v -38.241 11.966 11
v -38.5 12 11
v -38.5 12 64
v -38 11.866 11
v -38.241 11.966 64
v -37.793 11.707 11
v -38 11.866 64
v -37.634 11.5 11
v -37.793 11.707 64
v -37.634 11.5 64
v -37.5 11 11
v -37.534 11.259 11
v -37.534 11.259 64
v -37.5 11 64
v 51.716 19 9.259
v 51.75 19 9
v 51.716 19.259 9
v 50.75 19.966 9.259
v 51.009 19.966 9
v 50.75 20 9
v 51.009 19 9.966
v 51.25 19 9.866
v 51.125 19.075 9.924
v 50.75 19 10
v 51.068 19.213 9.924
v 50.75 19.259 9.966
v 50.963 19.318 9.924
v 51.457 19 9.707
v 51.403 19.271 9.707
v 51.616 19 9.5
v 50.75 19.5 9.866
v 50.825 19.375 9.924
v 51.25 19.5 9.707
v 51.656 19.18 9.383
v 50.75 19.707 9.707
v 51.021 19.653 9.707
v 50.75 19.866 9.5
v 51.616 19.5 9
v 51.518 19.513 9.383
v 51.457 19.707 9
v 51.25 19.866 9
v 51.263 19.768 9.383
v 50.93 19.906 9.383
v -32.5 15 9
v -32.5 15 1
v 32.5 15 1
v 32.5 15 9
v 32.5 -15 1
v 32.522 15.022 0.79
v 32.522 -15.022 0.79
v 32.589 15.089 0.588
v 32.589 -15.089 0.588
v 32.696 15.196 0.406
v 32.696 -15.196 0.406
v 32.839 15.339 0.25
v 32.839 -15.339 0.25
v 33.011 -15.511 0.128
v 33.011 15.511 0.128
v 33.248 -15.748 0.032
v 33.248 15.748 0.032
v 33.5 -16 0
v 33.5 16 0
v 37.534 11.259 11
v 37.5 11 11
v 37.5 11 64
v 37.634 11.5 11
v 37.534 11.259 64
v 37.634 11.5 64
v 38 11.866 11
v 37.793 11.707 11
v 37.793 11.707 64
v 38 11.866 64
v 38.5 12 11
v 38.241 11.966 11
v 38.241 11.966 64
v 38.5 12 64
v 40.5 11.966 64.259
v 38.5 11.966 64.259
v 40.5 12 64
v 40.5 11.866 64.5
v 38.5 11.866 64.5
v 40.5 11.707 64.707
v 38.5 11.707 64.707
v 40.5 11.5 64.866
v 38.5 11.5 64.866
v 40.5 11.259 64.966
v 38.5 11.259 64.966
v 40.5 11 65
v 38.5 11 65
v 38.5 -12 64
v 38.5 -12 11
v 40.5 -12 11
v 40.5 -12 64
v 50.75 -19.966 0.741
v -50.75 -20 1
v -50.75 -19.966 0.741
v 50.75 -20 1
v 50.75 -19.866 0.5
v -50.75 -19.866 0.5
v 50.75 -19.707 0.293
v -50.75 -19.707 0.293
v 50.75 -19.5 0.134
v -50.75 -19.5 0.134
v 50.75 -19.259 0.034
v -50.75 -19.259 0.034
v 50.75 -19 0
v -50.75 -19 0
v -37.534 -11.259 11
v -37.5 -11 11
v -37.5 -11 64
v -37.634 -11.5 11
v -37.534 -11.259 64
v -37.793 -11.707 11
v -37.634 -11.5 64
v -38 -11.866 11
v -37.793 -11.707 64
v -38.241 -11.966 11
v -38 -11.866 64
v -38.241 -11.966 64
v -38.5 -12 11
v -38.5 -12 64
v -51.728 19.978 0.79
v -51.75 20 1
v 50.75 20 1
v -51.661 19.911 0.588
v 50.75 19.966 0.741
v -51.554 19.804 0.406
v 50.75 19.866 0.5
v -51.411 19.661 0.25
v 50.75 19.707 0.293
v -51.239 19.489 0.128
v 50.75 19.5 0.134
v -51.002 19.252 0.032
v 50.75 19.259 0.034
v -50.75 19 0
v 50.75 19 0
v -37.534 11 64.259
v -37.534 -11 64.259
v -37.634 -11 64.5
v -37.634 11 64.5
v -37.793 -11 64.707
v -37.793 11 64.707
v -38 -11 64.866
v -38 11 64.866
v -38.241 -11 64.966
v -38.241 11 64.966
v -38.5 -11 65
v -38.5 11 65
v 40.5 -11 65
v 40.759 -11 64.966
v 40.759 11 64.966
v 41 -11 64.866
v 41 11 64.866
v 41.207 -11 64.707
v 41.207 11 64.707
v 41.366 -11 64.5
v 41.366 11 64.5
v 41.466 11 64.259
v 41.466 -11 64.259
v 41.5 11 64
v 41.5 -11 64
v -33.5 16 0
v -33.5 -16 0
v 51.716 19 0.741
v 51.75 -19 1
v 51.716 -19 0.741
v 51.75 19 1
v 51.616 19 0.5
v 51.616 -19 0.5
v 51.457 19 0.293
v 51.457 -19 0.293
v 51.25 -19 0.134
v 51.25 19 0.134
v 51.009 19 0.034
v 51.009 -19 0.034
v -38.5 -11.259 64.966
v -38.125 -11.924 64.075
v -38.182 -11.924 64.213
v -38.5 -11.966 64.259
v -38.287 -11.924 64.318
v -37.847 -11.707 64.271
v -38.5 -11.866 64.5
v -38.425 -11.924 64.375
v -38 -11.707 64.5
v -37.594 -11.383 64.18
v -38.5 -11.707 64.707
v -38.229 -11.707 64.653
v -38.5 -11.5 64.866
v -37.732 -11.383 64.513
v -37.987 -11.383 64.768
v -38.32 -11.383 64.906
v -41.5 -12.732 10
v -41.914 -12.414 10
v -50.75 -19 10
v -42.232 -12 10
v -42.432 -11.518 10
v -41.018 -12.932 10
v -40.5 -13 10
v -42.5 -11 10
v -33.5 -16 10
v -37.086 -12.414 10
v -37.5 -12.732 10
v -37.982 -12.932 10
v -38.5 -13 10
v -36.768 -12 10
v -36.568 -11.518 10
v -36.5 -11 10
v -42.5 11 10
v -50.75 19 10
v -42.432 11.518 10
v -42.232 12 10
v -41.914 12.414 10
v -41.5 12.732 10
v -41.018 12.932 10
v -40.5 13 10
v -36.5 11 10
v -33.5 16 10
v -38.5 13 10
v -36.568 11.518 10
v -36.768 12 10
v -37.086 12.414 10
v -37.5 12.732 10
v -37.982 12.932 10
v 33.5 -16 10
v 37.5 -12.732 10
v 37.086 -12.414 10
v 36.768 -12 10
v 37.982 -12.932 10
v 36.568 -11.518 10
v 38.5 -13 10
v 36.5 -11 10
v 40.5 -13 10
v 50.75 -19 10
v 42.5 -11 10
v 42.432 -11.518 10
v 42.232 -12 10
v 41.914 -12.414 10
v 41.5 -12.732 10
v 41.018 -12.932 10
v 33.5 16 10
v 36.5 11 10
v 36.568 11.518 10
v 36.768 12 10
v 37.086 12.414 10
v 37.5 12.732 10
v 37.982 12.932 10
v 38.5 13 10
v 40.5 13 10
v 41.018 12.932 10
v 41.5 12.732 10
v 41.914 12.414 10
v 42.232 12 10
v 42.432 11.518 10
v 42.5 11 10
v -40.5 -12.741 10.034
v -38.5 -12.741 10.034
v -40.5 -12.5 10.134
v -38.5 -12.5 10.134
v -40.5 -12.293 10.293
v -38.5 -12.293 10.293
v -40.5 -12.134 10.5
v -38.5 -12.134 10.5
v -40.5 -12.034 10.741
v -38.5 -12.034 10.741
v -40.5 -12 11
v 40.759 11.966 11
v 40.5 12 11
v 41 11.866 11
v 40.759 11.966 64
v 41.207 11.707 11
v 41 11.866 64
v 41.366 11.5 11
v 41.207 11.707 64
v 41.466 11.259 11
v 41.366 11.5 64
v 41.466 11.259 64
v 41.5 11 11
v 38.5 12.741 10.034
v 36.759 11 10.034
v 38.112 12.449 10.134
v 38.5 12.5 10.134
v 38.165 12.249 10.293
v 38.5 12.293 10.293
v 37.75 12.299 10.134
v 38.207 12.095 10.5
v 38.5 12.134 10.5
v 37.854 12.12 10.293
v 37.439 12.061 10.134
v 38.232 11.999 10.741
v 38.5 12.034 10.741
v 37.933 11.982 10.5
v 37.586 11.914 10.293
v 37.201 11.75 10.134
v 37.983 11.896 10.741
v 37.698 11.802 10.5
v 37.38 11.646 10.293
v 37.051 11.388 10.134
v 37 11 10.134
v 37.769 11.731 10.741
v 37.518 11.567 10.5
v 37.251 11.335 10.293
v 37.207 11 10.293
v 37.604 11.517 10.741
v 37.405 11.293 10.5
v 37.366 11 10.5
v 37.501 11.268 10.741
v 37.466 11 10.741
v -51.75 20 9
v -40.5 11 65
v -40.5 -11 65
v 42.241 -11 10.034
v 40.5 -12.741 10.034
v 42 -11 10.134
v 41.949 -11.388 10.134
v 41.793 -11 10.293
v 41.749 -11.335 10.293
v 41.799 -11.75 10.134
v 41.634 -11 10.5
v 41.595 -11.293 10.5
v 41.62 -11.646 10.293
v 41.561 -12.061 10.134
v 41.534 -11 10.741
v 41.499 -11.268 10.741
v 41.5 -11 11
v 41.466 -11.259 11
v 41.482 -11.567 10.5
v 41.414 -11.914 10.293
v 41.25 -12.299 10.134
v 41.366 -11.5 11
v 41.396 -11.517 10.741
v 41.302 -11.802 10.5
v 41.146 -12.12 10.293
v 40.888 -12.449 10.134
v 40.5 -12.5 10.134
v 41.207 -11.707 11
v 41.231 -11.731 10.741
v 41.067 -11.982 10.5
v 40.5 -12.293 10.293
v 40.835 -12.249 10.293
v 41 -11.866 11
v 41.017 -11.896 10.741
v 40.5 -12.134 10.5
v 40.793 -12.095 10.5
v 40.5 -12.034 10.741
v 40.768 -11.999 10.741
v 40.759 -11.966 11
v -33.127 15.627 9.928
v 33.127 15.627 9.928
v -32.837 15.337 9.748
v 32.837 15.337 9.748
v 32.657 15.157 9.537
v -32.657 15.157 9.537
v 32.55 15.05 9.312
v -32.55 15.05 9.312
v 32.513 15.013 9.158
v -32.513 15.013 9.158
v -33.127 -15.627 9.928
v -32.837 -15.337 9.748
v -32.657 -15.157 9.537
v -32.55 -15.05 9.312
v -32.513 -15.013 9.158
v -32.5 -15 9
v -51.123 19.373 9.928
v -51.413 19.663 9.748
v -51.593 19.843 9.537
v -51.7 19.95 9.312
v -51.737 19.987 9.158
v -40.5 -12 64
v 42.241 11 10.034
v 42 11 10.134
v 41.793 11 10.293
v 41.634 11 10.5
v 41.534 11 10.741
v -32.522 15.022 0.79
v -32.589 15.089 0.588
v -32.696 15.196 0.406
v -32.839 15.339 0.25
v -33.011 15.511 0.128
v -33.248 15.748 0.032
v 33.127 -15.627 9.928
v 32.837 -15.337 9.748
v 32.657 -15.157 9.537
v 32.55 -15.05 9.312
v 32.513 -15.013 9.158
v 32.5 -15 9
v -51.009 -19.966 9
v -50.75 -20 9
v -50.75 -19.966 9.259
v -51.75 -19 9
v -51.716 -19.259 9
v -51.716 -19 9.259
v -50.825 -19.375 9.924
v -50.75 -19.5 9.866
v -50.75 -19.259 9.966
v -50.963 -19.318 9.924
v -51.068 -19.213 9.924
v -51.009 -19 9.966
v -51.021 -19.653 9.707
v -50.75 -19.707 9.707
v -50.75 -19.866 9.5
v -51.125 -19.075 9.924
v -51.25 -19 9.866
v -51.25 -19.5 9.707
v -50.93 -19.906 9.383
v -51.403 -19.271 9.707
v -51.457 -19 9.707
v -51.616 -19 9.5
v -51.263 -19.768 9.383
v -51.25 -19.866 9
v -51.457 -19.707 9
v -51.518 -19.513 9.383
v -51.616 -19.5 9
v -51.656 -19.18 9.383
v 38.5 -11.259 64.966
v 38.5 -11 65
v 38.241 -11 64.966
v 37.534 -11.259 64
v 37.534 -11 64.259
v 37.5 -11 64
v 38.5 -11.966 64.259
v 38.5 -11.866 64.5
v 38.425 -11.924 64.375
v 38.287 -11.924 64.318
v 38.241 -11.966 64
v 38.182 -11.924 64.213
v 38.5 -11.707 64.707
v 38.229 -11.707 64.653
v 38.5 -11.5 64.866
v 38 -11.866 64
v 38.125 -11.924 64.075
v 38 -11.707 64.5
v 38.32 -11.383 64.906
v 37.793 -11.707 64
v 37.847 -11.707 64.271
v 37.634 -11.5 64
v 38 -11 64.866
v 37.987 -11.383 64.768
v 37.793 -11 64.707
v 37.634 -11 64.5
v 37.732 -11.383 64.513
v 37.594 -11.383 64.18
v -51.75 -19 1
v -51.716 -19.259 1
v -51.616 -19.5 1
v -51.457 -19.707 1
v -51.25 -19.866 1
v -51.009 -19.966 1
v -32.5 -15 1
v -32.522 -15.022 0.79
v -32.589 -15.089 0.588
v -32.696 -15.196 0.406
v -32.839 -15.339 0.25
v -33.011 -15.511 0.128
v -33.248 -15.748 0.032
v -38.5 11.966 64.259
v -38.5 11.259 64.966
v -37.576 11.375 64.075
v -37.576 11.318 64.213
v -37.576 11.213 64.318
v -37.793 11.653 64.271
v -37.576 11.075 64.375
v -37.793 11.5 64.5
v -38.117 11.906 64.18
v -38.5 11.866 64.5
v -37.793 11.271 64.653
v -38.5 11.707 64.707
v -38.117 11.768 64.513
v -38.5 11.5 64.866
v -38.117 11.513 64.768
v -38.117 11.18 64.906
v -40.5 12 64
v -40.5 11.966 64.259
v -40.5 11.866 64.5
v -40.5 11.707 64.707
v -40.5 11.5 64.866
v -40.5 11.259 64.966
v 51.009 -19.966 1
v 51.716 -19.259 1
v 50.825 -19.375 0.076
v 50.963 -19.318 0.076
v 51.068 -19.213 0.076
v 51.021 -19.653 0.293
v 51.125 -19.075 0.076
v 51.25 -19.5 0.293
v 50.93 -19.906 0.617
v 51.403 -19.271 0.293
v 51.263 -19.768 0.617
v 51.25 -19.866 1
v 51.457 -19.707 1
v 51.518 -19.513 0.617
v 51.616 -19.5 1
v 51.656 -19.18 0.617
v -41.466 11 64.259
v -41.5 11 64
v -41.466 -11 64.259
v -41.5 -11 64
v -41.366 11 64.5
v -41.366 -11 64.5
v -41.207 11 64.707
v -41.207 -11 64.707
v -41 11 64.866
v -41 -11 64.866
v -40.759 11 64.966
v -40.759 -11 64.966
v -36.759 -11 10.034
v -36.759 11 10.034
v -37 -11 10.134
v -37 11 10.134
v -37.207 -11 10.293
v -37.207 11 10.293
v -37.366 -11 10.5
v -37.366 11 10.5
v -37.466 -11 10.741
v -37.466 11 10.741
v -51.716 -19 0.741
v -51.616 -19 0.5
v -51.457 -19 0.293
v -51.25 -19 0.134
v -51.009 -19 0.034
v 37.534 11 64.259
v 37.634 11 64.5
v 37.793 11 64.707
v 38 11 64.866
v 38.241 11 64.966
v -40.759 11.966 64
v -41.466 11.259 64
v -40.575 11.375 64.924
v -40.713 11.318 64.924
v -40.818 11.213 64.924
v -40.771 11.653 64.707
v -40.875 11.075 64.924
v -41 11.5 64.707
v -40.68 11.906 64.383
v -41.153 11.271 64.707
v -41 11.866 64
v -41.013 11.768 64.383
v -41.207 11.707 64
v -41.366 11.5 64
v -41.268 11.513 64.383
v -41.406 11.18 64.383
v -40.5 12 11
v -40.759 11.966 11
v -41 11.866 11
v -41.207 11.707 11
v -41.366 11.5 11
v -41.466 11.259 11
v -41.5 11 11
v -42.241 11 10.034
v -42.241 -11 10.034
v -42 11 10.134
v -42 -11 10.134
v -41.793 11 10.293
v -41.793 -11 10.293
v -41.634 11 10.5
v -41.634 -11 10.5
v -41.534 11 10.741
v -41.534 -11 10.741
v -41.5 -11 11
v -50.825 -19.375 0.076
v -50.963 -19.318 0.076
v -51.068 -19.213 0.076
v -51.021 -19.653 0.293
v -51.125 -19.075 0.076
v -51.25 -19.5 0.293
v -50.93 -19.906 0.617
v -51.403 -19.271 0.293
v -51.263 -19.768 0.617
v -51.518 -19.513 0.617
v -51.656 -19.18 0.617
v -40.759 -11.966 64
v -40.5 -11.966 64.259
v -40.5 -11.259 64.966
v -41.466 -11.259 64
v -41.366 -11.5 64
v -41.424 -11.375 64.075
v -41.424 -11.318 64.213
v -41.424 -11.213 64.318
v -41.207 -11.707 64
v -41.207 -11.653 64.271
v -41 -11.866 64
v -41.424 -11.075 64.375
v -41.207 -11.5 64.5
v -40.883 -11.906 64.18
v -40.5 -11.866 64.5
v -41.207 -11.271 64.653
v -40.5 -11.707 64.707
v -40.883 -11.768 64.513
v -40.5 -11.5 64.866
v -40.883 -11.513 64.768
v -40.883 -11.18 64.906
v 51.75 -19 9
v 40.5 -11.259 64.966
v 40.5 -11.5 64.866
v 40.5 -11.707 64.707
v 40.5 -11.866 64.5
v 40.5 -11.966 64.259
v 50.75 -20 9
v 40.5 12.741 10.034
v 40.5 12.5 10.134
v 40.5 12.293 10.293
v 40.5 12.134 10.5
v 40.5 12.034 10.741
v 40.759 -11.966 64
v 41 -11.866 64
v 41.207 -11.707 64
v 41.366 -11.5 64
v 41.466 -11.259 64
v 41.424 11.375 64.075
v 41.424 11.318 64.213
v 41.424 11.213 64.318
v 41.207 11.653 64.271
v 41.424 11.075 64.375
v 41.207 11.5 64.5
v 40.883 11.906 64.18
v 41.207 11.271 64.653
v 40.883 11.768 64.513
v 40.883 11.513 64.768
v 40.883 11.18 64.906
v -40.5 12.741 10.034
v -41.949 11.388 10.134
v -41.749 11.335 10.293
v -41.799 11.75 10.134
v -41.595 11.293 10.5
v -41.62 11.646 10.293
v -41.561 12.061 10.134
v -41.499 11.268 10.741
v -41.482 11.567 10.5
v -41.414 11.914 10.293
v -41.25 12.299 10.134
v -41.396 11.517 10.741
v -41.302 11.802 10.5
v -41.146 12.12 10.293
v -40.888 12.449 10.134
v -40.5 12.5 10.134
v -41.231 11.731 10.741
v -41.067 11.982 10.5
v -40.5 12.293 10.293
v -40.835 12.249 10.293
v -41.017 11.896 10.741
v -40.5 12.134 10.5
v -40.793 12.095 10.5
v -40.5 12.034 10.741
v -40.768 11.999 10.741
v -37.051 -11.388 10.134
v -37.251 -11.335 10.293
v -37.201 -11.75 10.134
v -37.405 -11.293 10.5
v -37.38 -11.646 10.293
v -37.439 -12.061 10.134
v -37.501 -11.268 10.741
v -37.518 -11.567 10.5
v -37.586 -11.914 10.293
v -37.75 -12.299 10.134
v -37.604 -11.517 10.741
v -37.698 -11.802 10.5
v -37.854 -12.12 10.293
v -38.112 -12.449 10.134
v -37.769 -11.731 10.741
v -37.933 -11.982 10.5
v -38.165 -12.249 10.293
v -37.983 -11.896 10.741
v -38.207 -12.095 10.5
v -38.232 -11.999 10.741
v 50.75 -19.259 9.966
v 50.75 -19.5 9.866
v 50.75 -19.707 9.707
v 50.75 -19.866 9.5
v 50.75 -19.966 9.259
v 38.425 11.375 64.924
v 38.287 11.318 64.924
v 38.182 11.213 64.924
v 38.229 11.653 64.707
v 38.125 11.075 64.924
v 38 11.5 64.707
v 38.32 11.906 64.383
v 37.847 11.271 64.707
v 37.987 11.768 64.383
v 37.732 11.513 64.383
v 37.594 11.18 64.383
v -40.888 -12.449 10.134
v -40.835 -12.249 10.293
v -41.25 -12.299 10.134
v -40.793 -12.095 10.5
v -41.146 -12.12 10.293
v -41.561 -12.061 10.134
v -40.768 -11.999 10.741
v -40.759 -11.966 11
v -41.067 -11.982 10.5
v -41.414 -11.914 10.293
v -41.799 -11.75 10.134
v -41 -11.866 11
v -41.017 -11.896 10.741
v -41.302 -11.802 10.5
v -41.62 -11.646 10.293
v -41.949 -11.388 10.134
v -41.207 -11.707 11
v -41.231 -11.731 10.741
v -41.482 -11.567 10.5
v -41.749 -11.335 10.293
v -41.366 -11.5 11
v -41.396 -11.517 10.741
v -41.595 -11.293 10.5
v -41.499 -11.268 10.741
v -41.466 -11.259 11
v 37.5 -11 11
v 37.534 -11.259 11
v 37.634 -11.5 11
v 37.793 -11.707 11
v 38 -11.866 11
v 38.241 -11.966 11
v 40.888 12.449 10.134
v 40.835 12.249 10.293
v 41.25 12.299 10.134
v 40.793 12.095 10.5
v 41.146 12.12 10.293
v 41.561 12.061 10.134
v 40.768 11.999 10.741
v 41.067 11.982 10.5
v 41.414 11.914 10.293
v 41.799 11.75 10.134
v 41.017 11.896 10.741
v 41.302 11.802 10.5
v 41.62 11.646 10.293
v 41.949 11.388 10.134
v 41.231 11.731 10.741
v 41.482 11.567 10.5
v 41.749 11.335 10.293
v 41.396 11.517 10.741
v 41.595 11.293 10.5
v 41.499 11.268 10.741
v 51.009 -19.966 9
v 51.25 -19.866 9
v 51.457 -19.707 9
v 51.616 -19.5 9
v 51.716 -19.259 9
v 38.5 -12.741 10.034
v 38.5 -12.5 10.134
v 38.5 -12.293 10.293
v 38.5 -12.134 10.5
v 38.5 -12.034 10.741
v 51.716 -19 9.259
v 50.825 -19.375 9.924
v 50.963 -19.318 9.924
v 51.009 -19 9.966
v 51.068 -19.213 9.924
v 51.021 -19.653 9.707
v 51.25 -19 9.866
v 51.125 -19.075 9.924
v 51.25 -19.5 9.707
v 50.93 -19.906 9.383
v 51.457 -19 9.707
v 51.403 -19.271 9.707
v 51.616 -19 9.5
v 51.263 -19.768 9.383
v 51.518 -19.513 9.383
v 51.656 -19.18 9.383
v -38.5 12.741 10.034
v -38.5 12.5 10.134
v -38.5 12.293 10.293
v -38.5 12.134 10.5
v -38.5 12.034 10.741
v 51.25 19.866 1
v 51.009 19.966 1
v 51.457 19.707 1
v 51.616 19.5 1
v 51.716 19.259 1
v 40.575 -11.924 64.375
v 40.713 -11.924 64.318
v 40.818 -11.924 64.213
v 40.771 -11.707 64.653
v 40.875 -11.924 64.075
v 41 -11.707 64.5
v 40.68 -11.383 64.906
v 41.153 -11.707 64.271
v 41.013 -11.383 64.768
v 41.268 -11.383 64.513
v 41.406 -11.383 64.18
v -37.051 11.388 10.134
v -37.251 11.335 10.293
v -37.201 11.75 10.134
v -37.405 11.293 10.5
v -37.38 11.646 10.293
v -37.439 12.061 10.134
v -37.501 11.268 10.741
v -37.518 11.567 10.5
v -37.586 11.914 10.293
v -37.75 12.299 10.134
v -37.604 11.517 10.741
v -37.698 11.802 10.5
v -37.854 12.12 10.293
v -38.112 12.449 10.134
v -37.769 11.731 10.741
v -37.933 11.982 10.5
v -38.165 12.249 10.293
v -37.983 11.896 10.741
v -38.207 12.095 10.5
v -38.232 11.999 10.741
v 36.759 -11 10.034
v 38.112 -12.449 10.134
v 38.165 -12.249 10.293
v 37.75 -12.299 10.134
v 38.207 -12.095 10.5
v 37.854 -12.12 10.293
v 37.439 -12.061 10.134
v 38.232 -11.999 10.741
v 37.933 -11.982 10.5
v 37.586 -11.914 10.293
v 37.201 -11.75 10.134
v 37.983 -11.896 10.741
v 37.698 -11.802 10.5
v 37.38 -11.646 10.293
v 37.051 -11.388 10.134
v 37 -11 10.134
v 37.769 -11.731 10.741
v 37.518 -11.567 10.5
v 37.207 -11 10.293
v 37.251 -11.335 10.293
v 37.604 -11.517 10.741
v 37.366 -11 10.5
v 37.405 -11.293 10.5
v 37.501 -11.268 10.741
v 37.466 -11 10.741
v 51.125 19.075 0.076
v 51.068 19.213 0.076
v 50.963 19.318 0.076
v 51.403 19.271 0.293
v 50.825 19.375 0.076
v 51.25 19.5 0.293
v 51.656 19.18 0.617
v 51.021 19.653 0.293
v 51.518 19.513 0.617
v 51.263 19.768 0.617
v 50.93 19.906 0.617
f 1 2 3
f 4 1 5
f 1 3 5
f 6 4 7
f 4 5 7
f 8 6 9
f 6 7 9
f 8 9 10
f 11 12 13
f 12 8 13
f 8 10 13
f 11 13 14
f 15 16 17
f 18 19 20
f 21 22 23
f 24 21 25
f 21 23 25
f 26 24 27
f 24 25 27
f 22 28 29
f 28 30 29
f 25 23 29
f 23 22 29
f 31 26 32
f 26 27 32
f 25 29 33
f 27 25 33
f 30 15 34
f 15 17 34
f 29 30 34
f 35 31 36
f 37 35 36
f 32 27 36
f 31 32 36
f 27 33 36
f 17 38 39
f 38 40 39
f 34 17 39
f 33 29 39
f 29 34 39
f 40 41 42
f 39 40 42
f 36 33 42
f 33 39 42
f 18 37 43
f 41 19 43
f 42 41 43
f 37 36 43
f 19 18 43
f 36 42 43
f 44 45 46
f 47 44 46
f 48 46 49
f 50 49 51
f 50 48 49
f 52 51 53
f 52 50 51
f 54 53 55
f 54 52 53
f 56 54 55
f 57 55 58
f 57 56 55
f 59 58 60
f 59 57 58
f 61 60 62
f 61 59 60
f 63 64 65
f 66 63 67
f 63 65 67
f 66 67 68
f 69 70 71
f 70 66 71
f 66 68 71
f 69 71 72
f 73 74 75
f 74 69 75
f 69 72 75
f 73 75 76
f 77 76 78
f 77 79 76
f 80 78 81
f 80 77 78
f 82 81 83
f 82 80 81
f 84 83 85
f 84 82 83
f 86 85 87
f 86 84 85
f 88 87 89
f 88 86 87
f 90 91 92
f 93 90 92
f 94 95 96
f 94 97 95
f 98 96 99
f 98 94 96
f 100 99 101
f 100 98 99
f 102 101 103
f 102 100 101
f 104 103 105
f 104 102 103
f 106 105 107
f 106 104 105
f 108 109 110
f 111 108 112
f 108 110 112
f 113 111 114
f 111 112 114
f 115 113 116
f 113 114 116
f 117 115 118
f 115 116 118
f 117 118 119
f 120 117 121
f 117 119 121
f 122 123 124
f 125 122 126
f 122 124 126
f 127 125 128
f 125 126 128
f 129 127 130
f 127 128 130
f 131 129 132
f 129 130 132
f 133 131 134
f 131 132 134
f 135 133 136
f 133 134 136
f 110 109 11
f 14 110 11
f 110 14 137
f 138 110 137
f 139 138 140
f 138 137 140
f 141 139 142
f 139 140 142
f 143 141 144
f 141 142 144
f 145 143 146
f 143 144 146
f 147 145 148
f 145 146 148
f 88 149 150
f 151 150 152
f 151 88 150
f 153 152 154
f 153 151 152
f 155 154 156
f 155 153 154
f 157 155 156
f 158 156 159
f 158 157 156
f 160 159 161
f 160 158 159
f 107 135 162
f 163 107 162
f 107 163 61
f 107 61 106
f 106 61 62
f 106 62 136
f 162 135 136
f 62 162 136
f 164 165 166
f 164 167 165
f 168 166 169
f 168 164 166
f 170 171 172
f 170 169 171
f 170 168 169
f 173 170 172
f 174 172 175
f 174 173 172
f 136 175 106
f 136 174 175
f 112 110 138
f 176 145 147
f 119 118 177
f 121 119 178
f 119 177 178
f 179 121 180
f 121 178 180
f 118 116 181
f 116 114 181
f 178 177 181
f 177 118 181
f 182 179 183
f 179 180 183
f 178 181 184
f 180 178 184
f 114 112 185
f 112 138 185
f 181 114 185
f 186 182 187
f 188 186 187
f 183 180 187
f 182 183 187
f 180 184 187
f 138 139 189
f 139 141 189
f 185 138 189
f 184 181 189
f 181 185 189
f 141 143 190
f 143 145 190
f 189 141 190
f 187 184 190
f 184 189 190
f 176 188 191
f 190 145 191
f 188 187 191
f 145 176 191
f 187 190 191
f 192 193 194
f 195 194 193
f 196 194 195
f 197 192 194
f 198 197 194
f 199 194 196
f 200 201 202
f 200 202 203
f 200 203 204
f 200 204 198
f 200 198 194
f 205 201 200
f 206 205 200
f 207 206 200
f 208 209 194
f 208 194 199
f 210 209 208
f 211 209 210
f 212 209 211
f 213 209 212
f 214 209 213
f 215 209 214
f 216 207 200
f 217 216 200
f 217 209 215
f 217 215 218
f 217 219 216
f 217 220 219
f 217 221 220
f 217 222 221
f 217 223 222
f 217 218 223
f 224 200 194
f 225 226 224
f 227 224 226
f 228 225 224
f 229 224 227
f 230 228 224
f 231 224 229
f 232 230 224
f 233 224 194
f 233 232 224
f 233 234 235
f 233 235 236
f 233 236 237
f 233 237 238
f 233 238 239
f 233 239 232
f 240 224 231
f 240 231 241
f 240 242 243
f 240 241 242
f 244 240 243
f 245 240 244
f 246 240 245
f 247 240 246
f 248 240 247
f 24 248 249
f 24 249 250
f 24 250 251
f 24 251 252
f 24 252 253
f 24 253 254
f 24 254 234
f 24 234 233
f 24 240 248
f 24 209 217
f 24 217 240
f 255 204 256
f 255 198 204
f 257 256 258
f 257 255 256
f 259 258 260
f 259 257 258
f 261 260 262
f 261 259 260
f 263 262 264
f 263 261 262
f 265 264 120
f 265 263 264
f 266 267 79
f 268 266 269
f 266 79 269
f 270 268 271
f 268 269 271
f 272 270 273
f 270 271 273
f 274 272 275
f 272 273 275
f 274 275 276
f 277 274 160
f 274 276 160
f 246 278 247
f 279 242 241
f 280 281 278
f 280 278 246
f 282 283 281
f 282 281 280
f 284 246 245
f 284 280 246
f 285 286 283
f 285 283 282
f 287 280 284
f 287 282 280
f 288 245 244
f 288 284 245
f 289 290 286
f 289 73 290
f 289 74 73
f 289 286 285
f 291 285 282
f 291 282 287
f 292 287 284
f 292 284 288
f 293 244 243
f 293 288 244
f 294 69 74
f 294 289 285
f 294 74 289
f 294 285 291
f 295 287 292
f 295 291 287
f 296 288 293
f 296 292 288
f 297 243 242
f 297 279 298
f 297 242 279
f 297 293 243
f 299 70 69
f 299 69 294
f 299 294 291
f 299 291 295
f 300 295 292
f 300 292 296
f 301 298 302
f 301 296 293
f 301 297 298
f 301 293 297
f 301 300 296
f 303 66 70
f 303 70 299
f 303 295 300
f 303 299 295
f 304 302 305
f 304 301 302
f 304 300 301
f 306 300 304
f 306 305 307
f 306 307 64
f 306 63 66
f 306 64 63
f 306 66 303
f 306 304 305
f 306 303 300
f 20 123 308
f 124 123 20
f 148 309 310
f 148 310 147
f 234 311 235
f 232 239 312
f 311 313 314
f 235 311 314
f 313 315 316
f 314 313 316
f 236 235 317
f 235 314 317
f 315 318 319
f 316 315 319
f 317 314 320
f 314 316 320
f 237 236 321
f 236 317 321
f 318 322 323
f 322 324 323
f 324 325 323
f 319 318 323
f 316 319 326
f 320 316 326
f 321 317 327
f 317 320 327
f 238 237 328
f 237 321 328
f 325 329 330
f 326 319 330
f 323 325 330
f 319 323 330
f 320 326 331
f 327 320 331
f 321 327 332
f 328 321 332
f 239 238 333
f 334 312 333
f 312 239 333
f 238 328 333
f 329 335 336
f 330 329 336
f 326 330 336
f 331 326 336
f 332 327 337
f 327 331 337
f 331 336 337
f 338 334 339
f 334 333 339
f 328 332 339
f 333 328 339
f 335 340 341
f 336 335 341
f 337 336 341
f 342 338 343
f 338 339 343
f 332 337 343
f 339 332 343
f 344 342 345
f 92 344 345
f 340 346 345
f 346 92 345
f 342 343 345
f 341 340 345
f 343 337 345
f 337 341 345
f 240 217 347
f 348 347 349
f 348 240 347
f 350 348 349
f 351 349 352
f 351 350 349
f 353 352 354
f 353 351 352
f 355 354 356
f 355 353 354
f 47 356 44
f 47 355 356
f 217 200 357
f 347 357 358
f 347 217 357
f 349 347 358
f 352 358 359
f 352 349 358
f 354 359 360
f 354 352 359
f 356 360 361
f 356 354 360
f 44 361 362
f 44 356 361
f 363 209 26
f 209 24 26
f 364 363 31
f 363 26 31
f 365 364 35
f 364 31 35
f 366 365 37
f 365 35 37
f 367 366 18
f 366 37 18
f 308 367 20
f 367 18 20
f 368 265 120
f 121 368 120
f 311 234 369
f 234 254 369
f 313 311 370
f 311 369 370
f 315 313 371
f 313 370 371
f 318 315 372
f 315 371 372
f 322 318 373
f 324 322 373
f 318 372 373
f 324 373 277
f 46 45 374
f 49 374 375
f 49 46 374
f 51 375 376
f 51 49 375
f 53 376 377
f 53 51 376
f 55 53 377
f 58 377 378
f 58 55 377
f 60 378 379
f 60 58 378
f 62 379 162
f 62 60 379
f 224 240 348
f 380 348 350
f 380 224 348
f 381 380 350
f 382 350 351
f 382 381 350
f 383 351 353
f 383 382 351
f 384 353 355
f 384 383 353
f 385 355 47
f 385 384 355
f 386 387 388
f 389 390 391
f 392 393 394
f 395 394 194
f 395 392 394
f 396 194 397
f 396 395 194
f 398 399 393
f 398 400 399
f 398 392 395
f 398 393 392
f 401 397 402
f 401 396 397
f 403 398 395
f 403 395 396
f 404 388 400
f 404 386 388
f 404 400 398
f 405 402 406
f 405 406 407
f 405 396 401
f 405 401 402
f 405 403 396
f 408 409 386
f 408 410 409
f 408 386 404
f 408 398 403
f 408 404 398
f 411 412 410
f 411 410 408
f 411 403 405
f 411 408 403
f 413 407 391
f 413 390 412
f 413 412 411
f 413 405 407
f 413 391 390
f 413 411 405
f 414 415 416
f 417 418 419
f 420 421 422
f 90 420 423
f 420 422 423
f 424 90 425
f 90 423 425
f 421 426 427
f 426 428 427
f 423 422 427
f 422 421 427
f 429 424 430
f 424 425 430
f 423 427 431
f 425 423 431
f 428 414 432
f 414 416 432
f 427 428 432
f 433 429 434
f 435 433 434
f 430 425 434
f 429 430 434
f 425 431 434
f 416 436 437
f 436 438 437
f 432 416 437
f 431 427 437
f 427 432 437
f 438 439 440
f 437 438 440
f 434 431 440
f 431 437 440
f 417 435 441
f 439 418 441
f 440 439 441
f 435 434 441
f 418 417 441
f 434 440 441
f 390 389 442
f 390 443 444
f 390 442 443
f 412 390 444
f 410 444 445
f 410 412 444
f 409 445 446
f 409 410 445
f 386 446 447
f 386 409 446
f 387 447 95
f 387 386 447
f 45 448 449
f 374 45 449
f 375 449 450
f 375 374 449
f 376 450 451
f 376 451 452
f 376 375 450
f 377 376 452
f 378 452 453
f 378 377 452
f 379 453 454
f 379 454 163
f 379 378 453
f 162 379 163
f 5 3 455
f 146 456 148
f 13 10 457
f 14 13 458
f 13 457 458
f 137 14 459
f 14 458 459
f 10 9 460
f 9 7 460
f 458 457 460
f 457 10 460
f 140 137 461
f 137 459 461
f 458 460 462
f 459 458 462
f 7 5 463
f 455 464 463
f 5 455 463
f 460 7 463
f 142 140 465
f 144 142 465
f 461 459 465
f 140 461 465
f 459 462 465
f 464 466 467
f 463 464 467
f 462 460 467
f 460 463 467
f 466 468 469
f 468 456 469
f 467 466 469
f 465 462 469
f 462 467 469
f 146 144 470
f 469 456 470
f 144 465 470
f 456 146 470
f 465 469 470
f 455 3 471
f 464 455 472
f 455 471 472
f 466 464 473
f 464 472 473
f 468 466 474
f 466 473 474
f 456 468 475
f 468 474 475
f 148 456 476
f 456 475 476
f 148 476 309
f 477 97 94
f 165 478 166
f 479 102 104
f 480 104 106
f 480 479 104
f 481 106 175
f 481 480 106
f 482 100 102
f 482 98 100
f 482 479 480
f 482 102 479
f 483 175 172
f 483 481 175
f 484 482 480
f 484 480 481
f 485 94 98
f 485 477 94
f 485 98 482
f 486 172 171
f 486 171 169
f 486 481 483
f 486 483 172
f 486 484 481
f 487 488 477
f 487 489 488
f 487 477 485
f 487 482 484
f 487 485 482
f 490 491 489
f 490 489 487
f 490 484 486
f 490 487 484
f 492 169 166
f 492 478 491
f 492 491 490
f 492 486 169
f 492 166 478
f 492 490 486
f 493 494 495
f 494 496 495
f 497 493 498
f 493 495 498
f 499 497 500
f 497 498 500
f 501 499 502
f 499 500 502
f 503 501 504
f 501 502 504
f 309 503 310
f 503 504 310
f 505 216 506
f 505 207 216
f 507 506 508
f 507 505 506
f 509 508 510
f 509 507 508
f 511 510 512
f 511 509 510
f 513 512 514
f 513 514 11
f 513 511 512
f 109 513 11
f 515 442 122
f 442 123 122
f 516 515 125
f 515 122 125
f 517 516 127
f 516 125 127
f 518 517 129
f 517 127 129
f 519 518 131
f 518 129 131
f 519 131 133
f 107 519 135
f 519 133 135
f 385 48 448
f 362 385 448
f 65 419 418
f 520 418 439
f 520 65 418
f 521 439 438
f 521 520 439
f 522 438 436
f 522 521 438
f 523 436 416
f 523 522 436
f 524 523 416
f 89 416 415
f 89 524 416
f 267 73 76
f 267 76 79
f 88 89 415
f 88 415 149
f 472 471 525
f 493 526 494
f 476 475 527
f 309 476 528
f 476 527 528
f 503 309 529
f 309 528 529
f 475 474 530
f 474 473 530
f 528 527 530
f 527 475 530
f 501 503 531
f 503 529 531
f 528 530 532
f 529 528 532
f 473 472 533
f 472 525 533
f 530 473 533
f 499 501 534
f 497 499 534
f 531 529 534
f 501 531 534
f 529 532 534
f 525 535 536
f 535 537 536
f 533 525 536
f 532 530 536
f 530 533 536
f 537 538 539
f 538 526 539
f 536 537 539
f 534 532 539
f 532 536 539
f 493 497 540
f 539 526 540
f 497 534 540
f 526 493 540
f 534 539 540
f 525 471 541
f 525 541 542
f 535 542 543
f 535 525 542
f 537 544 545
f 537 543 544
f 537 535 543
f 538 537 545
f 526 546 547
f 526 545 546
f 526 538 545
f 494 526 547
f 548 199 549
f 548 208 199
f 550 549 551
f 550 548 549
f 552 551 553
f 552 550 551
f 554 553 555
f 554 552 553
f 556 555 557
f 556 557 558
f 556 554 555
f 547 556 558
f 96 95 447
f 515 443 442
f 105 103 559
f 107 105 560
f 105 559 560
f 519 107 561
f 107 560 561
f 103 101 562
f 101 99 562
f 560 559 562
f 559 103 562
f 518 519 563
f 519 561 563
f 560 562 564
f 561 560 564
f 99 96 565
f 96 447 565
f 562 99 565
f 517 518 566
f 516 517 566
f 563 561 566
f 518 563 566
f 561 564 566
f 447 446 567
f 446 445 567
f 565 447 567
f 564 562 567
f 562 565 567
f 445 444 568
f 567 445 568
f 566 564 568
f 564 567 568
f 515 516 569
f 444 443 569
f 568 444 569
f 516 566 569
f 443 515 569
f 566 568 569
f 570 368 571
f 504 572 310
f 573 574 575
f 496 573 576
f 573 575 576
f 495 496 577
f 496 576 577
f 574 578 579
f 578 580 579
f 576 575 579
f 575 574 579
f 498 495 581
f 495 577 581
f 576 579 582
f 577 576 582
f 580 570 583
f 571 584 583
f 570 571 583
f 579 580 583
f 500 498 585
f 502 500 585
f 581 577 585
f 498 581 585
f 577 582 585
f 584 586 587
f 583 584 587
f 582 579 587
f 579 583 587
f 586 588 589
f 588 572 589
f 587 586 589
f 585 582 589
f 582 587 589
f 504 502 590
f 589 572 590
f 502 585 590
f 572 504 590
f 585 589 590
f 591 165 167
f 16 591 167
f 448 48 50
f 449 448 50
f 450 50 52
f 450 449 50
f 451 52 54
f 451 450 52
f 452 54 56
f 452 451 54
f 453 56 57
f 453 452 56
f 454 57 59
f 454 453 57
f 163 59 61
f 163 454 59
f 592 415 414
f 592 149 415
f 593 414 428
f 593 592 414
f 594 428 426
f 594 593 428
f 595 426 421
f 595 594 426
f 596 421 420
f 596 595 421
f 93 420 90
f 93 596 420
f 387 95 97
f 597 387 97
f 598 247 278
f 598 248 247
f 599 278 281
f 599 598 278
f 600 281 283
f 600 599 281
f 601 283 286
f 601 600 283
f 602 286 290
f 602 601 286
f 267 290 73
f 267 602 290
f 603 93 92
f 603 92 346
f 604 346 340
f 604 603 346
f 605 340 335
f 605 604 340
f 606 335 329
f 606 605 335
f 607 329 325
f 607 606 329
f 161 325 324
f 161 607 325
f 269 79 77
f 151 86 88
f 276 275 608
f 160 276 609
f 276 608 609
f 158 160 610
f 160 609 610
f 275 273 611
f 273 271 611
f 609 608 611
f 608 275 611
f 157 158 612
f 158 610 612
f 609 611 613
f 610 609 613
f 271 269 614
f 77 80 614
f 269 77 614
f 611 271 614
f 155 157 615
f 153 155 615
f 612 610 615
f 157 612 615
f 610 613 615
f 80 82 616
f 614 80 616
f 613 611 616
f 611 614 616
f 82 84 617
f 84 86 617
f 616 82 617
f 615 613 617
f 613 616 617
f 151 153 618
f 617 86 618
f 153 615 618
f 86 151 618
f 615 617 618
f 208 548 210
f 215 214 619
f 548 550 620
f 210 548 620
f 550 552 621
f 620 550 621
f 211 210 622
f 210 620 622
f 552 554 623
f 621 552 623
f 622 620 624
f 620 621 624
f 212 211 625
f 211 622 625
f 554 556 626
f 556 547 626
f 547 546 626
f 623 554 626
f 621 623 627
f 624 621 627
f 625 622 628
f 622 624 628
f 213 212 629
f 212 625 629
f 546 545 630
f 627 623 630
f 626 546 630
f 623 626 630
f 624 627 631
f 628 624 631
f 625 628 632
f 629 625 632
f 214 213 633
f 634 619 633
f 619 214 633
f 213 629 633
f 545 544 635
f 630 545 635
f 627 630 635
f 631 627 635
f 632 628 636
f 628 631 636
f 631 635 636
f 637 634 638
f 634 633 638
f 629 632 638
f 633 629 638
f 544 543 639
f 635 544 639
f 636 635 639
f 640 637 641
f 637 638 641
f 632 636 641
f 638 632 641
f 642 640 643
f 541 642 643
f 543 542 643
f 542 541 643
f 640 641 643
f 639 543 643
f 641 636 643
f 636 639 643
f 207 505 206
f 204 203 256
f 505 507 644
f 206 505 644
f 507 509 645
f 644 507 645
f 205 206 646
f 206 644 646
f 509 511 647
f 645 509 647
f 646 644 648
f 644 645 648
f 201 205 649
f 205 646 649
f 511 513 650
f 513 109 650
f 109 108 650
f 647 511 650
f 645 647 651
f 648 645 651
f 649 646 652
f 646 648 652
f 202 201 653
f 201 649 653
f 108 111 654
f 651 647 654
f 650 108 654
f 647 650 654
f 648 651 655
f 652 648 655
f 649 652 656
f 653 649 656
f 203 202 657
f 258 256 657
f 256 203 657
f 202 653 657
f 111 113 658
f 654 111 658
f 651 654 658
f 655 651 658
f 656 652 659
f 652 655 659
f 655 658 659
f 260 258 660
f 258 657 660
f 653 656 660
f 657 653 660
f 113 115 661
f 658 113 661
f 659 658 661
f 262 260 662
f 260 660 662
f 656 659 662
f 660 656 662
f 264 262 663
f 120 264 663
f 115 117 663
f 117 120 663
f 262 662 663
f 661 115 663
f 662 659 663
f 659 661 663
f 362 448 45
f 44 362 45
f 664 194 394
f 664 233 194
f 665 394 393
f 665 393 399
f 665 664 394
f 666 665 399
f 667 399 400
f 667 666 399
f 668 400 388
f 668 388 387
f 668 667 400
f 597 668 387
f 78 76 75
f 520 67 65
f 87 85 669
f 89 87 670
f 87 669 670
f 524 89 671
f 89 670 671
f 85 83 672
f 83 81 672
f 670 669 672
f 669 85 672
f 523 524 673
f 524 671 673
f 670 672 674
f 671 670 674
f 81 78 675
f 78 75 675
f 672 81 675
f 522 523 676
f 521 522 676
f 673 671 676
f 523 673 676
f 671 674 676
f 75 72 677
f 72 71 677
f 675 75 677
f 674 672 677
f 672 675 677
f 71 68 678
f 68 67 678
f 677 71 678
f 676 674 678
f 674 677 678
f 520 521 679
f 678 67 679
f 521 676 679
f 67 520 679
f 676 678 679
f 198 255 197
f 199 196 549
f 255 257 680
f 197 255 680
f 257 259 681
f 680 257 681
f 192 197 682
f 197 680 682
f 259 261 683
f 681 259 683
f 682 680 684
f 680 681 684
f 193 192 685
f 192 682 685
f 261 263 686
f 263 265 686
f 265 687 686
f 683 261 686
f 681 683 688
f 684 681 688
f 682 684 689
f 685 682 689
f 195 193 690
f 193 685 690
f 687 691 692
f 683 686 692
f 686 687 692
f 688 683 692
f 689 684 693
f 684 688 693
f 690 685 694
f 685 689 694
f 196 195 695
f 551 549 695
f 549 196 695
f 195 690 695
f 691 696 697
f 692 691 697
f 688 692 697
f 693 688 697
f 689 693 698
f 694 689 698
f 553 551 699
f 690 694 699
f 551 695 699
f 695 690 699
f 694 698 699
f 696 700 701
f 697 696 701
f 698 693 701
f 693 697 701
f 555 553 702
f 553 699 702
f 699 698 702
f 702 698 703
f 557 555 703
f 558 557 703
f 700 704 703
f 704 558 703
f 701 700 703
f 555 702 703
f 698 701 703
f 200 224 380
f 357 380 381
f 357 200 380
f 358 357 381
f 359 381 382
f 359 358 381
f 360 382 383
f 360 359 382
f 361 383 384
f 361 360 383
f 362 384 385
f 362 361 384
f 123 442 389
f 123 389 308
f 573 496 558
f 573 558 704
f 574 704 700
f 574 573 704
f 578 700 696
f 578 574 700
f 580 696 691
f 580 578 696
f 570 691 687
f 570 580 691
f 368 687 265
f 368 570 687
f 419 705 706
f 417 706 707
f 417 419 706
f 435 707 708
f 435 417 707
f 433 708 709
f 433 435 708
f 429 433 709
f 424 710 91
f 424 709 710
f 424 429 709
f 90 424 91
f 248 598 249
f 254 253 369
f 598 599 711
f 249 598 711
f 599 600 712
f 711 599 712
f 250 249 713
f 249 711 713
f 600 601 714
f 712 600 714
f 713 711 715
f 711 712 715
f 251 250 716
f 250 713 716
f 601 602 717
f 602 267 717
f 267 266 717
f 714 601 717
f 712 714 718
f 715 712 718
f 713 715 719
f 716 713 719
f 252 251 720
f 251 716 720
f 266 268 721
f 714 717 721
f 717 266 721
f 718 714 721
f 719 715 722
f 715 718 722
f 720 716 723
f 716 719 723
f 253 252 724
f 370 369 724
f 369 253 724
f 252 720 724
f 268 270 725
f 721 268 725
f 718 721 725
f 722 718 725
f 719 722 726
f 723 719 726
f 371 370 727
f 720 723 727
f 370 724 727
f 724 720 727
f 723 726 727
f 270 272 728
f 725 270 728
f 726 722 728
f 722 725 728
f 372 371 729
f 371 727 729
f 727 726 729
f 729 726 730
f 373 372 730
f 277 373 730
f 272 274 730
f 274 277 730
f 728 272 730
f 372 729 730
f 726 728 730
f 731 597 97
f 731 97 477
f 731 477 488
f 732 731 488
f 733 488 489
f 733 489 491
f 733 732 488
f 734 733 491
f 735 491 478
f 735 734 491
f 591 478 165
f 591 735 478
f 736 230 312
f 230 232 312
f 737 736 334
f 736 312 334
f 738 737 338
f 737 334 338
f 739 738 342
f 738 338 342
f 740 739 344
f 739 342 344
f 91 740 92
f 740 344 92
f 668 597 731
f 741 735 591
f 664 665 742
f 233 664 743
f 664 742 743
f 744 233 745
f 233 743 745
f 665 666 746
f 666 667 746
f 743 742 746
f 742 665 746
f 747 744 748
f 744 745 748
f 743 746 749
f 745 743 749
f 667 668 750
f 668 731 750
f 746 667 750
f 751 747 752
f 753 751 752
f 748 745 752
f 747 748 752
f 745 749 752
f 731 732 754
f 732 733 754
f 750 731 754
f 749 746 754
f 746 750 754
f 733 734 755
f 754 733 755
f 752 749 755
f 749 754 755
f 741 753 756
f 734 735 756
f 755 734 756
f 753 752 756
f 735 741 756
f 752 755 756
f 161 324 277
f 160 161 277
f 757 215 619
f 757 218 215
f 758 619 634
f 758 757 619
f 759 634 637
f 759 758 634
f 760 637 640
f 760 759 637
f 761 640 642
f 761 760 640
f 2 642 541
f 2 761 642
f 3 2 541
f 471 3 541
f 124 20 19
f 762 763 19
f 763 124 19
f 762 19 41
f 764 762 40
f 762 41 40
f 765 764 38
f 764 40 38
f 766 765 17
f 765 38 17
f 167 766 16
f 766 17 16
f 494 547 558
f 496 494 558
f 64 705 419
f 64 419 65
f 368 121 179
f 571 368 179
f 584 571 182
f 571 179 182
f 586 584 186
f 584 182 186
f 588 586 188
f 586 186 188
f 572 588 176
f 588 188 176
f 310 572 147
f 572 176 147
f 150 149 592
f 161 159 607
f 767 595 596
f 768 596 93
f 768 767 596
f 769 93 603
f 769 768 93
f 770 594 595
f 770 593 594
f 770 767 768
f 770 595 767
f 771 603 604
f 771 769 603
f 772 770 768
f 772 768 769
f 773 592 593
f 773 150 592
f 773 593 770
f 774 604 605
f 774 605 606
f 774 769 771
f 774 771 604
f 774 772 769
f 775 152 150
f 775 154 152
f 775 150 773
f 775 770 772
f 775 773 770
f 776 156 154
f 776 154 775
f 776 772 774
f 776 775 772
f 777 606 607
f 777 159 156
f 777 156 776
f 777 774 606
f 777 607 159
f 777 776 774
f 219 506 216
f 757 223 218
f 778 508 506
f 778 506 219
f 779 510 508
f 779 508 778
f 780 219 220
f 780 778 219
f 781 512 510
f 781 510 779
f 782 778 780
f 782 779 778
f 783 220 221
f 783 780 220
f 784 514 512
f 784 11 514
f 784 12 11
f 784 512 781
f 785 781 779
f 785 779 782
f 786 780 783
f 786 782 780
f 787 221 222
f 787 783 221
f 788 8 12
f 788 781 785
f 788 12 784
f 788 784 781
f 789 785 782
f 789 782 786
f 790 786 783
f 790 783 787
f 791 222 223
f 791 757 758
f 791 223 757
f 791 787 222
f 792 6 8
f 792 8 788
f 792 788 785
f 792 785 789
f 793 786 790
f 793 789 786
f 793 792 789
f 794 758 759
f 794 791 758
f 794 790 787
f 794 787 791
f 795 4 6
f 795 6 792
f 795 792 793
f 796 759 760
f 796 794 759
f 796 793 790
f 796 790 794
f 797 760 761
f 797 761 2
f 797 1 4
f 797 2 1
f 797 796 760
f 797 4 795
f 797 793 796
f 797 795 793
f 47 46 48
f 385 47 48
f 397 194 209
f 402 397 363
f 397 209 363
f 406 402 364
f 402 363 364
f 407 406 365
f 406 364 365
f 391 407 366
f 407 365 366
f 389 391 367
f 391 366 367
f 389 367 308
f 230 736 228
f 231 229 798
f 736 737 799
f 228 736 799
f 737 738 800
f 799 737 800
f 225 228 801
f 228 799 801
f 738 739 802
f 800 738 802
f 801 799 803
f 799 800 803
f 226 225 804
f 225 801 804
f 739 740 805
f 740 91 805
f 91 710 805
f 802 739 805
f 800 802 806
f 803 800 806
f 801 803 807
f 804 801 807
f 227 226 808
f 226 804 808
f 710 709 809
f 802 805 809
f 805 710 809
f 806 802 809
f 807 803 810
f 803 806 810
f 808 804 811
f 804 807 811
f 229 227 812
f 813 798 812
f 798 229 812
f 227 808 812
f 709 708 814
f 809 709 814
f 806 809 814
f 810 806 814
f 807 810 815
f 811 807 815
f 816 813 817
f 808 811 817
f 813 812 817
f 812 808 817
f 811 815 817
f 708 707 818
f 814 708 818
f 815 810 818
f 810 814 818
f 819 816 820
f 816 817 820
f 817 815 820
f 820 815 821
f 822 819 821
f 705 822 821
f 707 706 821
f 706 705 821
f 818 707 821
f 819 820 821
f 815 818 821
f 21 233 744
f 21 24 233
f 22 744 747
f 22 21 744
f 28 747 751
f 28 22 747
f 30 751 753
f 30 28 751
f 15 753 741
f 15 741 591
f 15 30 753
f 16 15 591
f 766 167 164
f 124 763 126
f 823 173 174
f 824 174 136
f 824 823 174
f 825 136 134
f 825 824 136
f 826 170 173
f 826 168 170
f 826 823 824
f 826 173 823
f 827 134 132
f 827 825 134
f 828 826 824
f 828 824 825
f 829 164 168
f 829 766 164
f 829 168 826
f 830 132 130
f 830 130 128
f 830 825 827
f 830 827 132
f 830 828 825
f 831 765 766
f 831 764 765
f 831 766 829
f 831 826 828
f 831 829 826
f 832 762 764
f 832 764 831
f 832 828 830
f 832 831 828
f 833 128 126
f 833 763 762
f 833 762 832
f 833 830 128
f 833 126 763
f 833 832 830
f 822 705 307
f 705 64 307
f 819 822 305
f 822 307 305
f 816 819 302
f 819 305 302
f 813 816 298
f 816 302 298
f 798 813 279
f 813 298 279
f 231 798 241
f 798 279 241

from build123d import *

# Parameters (mm, degrees)
F0_W     = 103.5
F0_H     = 40
F0_W_2   = 4
F0_H_2   = 24
F1_DEPTH = 10
F2_DEPTH = 65
F3_DEPTH = 65
F4_R     = 1


with BuildPart() as f1:
    # F0 (on Top) → F1 (new body)
    with BuildSketch(Plane.XY):
        Rectangle(F0_W, F0_H)
        Polygon((-37.5, 12), (-37.5, 0), (-37.5, -12), (-41.5, -12), (-41.5, 12), align=None, mode=Mode.SUBTRACT)
        Polygon((32.5, -15), (-32.5, -15), (-32.5, 0), (-32.5, 15), (32.5, 15), align=None, mode=Mode.SUBTRACT)
        with Locations((39.5, 0)):
            Rectangle(F0_W_2, F0_H_2, mode=Mode.SUBTRACT)
    extrude(amount=F1_DEPTH)

    # F0 (on Top) → F2 (join)
    with BuildSketch(Plane.XY):
        Polygon((-37.5, -12), (-37.5, 0), (-37.5, 12), (-41.5, 12), (-41.5, -12), align=None)
    extrude(amount=F2_DEPTH)

    # F0 (on Top) → F3 (join)
    with BuildSketch(Plane.XY):
        with Locations((39.5, 0)):
            Rectangle(F0_W_2, F0_H_2)
    extrude(amount=F3_DEPTH)

    # F4
    f4_edges = [f1.edges().sort_by_distance(p)[0] for p in [
        (-51.75, -20, 5),
        (51.75, -20, 5),
        (0, -20, 0),
        (0, -20, 10),
        (51.75, 20, 5),
        (51.75, 0, 0),
        (51.75, 0, 10),
        (0, 20, 10),
        (-51.75, 0, 10),
        (-37.5, 0, 10),
        (-39.5, -12, 10),
        (-41.5, 0, 10),
        (-39.5, 12, 10),
        (0, -15, 10),
        (-32.5, 0, 10),
        (0, 15, 10),
        (32.5, 0, 10),
        (39.5, 12, 10),
        (41.5, 0, 10),
        (39.5, -12, 10),
        (37.5, 0, 10),
        (37.5, 12, 37.5),
        (39.5, 12, 65),
        (41.5, 12, 37.5),
        (41.5, 0, 65),
        (37.5, 0, 65),
        (39.5, -12, 65),
        (-41.5, 12, 37.5),
        (-39.5, 12, 65),
        (-37.5, 12, 37.5),
        (41.5, -12, 37.5),
        (37.5, -12, 37.5),
        (-37.5, 0, 65),
        (-37.5, -12, 37.5),
        (-39.5, -12, 65),
        (-41.5, -12, 37.5),
        (-41.5, 0, 65),
        (0, 20, 0),
        (-51.75, 0, 0),
        (0, -15, 0),
        (-32.5, 0, 0),
        (0, 15, 0),
        (32.5, 0, 0),
    ]]
    fillet(f4_edges, radius=F4_R)


solid = f1.part
